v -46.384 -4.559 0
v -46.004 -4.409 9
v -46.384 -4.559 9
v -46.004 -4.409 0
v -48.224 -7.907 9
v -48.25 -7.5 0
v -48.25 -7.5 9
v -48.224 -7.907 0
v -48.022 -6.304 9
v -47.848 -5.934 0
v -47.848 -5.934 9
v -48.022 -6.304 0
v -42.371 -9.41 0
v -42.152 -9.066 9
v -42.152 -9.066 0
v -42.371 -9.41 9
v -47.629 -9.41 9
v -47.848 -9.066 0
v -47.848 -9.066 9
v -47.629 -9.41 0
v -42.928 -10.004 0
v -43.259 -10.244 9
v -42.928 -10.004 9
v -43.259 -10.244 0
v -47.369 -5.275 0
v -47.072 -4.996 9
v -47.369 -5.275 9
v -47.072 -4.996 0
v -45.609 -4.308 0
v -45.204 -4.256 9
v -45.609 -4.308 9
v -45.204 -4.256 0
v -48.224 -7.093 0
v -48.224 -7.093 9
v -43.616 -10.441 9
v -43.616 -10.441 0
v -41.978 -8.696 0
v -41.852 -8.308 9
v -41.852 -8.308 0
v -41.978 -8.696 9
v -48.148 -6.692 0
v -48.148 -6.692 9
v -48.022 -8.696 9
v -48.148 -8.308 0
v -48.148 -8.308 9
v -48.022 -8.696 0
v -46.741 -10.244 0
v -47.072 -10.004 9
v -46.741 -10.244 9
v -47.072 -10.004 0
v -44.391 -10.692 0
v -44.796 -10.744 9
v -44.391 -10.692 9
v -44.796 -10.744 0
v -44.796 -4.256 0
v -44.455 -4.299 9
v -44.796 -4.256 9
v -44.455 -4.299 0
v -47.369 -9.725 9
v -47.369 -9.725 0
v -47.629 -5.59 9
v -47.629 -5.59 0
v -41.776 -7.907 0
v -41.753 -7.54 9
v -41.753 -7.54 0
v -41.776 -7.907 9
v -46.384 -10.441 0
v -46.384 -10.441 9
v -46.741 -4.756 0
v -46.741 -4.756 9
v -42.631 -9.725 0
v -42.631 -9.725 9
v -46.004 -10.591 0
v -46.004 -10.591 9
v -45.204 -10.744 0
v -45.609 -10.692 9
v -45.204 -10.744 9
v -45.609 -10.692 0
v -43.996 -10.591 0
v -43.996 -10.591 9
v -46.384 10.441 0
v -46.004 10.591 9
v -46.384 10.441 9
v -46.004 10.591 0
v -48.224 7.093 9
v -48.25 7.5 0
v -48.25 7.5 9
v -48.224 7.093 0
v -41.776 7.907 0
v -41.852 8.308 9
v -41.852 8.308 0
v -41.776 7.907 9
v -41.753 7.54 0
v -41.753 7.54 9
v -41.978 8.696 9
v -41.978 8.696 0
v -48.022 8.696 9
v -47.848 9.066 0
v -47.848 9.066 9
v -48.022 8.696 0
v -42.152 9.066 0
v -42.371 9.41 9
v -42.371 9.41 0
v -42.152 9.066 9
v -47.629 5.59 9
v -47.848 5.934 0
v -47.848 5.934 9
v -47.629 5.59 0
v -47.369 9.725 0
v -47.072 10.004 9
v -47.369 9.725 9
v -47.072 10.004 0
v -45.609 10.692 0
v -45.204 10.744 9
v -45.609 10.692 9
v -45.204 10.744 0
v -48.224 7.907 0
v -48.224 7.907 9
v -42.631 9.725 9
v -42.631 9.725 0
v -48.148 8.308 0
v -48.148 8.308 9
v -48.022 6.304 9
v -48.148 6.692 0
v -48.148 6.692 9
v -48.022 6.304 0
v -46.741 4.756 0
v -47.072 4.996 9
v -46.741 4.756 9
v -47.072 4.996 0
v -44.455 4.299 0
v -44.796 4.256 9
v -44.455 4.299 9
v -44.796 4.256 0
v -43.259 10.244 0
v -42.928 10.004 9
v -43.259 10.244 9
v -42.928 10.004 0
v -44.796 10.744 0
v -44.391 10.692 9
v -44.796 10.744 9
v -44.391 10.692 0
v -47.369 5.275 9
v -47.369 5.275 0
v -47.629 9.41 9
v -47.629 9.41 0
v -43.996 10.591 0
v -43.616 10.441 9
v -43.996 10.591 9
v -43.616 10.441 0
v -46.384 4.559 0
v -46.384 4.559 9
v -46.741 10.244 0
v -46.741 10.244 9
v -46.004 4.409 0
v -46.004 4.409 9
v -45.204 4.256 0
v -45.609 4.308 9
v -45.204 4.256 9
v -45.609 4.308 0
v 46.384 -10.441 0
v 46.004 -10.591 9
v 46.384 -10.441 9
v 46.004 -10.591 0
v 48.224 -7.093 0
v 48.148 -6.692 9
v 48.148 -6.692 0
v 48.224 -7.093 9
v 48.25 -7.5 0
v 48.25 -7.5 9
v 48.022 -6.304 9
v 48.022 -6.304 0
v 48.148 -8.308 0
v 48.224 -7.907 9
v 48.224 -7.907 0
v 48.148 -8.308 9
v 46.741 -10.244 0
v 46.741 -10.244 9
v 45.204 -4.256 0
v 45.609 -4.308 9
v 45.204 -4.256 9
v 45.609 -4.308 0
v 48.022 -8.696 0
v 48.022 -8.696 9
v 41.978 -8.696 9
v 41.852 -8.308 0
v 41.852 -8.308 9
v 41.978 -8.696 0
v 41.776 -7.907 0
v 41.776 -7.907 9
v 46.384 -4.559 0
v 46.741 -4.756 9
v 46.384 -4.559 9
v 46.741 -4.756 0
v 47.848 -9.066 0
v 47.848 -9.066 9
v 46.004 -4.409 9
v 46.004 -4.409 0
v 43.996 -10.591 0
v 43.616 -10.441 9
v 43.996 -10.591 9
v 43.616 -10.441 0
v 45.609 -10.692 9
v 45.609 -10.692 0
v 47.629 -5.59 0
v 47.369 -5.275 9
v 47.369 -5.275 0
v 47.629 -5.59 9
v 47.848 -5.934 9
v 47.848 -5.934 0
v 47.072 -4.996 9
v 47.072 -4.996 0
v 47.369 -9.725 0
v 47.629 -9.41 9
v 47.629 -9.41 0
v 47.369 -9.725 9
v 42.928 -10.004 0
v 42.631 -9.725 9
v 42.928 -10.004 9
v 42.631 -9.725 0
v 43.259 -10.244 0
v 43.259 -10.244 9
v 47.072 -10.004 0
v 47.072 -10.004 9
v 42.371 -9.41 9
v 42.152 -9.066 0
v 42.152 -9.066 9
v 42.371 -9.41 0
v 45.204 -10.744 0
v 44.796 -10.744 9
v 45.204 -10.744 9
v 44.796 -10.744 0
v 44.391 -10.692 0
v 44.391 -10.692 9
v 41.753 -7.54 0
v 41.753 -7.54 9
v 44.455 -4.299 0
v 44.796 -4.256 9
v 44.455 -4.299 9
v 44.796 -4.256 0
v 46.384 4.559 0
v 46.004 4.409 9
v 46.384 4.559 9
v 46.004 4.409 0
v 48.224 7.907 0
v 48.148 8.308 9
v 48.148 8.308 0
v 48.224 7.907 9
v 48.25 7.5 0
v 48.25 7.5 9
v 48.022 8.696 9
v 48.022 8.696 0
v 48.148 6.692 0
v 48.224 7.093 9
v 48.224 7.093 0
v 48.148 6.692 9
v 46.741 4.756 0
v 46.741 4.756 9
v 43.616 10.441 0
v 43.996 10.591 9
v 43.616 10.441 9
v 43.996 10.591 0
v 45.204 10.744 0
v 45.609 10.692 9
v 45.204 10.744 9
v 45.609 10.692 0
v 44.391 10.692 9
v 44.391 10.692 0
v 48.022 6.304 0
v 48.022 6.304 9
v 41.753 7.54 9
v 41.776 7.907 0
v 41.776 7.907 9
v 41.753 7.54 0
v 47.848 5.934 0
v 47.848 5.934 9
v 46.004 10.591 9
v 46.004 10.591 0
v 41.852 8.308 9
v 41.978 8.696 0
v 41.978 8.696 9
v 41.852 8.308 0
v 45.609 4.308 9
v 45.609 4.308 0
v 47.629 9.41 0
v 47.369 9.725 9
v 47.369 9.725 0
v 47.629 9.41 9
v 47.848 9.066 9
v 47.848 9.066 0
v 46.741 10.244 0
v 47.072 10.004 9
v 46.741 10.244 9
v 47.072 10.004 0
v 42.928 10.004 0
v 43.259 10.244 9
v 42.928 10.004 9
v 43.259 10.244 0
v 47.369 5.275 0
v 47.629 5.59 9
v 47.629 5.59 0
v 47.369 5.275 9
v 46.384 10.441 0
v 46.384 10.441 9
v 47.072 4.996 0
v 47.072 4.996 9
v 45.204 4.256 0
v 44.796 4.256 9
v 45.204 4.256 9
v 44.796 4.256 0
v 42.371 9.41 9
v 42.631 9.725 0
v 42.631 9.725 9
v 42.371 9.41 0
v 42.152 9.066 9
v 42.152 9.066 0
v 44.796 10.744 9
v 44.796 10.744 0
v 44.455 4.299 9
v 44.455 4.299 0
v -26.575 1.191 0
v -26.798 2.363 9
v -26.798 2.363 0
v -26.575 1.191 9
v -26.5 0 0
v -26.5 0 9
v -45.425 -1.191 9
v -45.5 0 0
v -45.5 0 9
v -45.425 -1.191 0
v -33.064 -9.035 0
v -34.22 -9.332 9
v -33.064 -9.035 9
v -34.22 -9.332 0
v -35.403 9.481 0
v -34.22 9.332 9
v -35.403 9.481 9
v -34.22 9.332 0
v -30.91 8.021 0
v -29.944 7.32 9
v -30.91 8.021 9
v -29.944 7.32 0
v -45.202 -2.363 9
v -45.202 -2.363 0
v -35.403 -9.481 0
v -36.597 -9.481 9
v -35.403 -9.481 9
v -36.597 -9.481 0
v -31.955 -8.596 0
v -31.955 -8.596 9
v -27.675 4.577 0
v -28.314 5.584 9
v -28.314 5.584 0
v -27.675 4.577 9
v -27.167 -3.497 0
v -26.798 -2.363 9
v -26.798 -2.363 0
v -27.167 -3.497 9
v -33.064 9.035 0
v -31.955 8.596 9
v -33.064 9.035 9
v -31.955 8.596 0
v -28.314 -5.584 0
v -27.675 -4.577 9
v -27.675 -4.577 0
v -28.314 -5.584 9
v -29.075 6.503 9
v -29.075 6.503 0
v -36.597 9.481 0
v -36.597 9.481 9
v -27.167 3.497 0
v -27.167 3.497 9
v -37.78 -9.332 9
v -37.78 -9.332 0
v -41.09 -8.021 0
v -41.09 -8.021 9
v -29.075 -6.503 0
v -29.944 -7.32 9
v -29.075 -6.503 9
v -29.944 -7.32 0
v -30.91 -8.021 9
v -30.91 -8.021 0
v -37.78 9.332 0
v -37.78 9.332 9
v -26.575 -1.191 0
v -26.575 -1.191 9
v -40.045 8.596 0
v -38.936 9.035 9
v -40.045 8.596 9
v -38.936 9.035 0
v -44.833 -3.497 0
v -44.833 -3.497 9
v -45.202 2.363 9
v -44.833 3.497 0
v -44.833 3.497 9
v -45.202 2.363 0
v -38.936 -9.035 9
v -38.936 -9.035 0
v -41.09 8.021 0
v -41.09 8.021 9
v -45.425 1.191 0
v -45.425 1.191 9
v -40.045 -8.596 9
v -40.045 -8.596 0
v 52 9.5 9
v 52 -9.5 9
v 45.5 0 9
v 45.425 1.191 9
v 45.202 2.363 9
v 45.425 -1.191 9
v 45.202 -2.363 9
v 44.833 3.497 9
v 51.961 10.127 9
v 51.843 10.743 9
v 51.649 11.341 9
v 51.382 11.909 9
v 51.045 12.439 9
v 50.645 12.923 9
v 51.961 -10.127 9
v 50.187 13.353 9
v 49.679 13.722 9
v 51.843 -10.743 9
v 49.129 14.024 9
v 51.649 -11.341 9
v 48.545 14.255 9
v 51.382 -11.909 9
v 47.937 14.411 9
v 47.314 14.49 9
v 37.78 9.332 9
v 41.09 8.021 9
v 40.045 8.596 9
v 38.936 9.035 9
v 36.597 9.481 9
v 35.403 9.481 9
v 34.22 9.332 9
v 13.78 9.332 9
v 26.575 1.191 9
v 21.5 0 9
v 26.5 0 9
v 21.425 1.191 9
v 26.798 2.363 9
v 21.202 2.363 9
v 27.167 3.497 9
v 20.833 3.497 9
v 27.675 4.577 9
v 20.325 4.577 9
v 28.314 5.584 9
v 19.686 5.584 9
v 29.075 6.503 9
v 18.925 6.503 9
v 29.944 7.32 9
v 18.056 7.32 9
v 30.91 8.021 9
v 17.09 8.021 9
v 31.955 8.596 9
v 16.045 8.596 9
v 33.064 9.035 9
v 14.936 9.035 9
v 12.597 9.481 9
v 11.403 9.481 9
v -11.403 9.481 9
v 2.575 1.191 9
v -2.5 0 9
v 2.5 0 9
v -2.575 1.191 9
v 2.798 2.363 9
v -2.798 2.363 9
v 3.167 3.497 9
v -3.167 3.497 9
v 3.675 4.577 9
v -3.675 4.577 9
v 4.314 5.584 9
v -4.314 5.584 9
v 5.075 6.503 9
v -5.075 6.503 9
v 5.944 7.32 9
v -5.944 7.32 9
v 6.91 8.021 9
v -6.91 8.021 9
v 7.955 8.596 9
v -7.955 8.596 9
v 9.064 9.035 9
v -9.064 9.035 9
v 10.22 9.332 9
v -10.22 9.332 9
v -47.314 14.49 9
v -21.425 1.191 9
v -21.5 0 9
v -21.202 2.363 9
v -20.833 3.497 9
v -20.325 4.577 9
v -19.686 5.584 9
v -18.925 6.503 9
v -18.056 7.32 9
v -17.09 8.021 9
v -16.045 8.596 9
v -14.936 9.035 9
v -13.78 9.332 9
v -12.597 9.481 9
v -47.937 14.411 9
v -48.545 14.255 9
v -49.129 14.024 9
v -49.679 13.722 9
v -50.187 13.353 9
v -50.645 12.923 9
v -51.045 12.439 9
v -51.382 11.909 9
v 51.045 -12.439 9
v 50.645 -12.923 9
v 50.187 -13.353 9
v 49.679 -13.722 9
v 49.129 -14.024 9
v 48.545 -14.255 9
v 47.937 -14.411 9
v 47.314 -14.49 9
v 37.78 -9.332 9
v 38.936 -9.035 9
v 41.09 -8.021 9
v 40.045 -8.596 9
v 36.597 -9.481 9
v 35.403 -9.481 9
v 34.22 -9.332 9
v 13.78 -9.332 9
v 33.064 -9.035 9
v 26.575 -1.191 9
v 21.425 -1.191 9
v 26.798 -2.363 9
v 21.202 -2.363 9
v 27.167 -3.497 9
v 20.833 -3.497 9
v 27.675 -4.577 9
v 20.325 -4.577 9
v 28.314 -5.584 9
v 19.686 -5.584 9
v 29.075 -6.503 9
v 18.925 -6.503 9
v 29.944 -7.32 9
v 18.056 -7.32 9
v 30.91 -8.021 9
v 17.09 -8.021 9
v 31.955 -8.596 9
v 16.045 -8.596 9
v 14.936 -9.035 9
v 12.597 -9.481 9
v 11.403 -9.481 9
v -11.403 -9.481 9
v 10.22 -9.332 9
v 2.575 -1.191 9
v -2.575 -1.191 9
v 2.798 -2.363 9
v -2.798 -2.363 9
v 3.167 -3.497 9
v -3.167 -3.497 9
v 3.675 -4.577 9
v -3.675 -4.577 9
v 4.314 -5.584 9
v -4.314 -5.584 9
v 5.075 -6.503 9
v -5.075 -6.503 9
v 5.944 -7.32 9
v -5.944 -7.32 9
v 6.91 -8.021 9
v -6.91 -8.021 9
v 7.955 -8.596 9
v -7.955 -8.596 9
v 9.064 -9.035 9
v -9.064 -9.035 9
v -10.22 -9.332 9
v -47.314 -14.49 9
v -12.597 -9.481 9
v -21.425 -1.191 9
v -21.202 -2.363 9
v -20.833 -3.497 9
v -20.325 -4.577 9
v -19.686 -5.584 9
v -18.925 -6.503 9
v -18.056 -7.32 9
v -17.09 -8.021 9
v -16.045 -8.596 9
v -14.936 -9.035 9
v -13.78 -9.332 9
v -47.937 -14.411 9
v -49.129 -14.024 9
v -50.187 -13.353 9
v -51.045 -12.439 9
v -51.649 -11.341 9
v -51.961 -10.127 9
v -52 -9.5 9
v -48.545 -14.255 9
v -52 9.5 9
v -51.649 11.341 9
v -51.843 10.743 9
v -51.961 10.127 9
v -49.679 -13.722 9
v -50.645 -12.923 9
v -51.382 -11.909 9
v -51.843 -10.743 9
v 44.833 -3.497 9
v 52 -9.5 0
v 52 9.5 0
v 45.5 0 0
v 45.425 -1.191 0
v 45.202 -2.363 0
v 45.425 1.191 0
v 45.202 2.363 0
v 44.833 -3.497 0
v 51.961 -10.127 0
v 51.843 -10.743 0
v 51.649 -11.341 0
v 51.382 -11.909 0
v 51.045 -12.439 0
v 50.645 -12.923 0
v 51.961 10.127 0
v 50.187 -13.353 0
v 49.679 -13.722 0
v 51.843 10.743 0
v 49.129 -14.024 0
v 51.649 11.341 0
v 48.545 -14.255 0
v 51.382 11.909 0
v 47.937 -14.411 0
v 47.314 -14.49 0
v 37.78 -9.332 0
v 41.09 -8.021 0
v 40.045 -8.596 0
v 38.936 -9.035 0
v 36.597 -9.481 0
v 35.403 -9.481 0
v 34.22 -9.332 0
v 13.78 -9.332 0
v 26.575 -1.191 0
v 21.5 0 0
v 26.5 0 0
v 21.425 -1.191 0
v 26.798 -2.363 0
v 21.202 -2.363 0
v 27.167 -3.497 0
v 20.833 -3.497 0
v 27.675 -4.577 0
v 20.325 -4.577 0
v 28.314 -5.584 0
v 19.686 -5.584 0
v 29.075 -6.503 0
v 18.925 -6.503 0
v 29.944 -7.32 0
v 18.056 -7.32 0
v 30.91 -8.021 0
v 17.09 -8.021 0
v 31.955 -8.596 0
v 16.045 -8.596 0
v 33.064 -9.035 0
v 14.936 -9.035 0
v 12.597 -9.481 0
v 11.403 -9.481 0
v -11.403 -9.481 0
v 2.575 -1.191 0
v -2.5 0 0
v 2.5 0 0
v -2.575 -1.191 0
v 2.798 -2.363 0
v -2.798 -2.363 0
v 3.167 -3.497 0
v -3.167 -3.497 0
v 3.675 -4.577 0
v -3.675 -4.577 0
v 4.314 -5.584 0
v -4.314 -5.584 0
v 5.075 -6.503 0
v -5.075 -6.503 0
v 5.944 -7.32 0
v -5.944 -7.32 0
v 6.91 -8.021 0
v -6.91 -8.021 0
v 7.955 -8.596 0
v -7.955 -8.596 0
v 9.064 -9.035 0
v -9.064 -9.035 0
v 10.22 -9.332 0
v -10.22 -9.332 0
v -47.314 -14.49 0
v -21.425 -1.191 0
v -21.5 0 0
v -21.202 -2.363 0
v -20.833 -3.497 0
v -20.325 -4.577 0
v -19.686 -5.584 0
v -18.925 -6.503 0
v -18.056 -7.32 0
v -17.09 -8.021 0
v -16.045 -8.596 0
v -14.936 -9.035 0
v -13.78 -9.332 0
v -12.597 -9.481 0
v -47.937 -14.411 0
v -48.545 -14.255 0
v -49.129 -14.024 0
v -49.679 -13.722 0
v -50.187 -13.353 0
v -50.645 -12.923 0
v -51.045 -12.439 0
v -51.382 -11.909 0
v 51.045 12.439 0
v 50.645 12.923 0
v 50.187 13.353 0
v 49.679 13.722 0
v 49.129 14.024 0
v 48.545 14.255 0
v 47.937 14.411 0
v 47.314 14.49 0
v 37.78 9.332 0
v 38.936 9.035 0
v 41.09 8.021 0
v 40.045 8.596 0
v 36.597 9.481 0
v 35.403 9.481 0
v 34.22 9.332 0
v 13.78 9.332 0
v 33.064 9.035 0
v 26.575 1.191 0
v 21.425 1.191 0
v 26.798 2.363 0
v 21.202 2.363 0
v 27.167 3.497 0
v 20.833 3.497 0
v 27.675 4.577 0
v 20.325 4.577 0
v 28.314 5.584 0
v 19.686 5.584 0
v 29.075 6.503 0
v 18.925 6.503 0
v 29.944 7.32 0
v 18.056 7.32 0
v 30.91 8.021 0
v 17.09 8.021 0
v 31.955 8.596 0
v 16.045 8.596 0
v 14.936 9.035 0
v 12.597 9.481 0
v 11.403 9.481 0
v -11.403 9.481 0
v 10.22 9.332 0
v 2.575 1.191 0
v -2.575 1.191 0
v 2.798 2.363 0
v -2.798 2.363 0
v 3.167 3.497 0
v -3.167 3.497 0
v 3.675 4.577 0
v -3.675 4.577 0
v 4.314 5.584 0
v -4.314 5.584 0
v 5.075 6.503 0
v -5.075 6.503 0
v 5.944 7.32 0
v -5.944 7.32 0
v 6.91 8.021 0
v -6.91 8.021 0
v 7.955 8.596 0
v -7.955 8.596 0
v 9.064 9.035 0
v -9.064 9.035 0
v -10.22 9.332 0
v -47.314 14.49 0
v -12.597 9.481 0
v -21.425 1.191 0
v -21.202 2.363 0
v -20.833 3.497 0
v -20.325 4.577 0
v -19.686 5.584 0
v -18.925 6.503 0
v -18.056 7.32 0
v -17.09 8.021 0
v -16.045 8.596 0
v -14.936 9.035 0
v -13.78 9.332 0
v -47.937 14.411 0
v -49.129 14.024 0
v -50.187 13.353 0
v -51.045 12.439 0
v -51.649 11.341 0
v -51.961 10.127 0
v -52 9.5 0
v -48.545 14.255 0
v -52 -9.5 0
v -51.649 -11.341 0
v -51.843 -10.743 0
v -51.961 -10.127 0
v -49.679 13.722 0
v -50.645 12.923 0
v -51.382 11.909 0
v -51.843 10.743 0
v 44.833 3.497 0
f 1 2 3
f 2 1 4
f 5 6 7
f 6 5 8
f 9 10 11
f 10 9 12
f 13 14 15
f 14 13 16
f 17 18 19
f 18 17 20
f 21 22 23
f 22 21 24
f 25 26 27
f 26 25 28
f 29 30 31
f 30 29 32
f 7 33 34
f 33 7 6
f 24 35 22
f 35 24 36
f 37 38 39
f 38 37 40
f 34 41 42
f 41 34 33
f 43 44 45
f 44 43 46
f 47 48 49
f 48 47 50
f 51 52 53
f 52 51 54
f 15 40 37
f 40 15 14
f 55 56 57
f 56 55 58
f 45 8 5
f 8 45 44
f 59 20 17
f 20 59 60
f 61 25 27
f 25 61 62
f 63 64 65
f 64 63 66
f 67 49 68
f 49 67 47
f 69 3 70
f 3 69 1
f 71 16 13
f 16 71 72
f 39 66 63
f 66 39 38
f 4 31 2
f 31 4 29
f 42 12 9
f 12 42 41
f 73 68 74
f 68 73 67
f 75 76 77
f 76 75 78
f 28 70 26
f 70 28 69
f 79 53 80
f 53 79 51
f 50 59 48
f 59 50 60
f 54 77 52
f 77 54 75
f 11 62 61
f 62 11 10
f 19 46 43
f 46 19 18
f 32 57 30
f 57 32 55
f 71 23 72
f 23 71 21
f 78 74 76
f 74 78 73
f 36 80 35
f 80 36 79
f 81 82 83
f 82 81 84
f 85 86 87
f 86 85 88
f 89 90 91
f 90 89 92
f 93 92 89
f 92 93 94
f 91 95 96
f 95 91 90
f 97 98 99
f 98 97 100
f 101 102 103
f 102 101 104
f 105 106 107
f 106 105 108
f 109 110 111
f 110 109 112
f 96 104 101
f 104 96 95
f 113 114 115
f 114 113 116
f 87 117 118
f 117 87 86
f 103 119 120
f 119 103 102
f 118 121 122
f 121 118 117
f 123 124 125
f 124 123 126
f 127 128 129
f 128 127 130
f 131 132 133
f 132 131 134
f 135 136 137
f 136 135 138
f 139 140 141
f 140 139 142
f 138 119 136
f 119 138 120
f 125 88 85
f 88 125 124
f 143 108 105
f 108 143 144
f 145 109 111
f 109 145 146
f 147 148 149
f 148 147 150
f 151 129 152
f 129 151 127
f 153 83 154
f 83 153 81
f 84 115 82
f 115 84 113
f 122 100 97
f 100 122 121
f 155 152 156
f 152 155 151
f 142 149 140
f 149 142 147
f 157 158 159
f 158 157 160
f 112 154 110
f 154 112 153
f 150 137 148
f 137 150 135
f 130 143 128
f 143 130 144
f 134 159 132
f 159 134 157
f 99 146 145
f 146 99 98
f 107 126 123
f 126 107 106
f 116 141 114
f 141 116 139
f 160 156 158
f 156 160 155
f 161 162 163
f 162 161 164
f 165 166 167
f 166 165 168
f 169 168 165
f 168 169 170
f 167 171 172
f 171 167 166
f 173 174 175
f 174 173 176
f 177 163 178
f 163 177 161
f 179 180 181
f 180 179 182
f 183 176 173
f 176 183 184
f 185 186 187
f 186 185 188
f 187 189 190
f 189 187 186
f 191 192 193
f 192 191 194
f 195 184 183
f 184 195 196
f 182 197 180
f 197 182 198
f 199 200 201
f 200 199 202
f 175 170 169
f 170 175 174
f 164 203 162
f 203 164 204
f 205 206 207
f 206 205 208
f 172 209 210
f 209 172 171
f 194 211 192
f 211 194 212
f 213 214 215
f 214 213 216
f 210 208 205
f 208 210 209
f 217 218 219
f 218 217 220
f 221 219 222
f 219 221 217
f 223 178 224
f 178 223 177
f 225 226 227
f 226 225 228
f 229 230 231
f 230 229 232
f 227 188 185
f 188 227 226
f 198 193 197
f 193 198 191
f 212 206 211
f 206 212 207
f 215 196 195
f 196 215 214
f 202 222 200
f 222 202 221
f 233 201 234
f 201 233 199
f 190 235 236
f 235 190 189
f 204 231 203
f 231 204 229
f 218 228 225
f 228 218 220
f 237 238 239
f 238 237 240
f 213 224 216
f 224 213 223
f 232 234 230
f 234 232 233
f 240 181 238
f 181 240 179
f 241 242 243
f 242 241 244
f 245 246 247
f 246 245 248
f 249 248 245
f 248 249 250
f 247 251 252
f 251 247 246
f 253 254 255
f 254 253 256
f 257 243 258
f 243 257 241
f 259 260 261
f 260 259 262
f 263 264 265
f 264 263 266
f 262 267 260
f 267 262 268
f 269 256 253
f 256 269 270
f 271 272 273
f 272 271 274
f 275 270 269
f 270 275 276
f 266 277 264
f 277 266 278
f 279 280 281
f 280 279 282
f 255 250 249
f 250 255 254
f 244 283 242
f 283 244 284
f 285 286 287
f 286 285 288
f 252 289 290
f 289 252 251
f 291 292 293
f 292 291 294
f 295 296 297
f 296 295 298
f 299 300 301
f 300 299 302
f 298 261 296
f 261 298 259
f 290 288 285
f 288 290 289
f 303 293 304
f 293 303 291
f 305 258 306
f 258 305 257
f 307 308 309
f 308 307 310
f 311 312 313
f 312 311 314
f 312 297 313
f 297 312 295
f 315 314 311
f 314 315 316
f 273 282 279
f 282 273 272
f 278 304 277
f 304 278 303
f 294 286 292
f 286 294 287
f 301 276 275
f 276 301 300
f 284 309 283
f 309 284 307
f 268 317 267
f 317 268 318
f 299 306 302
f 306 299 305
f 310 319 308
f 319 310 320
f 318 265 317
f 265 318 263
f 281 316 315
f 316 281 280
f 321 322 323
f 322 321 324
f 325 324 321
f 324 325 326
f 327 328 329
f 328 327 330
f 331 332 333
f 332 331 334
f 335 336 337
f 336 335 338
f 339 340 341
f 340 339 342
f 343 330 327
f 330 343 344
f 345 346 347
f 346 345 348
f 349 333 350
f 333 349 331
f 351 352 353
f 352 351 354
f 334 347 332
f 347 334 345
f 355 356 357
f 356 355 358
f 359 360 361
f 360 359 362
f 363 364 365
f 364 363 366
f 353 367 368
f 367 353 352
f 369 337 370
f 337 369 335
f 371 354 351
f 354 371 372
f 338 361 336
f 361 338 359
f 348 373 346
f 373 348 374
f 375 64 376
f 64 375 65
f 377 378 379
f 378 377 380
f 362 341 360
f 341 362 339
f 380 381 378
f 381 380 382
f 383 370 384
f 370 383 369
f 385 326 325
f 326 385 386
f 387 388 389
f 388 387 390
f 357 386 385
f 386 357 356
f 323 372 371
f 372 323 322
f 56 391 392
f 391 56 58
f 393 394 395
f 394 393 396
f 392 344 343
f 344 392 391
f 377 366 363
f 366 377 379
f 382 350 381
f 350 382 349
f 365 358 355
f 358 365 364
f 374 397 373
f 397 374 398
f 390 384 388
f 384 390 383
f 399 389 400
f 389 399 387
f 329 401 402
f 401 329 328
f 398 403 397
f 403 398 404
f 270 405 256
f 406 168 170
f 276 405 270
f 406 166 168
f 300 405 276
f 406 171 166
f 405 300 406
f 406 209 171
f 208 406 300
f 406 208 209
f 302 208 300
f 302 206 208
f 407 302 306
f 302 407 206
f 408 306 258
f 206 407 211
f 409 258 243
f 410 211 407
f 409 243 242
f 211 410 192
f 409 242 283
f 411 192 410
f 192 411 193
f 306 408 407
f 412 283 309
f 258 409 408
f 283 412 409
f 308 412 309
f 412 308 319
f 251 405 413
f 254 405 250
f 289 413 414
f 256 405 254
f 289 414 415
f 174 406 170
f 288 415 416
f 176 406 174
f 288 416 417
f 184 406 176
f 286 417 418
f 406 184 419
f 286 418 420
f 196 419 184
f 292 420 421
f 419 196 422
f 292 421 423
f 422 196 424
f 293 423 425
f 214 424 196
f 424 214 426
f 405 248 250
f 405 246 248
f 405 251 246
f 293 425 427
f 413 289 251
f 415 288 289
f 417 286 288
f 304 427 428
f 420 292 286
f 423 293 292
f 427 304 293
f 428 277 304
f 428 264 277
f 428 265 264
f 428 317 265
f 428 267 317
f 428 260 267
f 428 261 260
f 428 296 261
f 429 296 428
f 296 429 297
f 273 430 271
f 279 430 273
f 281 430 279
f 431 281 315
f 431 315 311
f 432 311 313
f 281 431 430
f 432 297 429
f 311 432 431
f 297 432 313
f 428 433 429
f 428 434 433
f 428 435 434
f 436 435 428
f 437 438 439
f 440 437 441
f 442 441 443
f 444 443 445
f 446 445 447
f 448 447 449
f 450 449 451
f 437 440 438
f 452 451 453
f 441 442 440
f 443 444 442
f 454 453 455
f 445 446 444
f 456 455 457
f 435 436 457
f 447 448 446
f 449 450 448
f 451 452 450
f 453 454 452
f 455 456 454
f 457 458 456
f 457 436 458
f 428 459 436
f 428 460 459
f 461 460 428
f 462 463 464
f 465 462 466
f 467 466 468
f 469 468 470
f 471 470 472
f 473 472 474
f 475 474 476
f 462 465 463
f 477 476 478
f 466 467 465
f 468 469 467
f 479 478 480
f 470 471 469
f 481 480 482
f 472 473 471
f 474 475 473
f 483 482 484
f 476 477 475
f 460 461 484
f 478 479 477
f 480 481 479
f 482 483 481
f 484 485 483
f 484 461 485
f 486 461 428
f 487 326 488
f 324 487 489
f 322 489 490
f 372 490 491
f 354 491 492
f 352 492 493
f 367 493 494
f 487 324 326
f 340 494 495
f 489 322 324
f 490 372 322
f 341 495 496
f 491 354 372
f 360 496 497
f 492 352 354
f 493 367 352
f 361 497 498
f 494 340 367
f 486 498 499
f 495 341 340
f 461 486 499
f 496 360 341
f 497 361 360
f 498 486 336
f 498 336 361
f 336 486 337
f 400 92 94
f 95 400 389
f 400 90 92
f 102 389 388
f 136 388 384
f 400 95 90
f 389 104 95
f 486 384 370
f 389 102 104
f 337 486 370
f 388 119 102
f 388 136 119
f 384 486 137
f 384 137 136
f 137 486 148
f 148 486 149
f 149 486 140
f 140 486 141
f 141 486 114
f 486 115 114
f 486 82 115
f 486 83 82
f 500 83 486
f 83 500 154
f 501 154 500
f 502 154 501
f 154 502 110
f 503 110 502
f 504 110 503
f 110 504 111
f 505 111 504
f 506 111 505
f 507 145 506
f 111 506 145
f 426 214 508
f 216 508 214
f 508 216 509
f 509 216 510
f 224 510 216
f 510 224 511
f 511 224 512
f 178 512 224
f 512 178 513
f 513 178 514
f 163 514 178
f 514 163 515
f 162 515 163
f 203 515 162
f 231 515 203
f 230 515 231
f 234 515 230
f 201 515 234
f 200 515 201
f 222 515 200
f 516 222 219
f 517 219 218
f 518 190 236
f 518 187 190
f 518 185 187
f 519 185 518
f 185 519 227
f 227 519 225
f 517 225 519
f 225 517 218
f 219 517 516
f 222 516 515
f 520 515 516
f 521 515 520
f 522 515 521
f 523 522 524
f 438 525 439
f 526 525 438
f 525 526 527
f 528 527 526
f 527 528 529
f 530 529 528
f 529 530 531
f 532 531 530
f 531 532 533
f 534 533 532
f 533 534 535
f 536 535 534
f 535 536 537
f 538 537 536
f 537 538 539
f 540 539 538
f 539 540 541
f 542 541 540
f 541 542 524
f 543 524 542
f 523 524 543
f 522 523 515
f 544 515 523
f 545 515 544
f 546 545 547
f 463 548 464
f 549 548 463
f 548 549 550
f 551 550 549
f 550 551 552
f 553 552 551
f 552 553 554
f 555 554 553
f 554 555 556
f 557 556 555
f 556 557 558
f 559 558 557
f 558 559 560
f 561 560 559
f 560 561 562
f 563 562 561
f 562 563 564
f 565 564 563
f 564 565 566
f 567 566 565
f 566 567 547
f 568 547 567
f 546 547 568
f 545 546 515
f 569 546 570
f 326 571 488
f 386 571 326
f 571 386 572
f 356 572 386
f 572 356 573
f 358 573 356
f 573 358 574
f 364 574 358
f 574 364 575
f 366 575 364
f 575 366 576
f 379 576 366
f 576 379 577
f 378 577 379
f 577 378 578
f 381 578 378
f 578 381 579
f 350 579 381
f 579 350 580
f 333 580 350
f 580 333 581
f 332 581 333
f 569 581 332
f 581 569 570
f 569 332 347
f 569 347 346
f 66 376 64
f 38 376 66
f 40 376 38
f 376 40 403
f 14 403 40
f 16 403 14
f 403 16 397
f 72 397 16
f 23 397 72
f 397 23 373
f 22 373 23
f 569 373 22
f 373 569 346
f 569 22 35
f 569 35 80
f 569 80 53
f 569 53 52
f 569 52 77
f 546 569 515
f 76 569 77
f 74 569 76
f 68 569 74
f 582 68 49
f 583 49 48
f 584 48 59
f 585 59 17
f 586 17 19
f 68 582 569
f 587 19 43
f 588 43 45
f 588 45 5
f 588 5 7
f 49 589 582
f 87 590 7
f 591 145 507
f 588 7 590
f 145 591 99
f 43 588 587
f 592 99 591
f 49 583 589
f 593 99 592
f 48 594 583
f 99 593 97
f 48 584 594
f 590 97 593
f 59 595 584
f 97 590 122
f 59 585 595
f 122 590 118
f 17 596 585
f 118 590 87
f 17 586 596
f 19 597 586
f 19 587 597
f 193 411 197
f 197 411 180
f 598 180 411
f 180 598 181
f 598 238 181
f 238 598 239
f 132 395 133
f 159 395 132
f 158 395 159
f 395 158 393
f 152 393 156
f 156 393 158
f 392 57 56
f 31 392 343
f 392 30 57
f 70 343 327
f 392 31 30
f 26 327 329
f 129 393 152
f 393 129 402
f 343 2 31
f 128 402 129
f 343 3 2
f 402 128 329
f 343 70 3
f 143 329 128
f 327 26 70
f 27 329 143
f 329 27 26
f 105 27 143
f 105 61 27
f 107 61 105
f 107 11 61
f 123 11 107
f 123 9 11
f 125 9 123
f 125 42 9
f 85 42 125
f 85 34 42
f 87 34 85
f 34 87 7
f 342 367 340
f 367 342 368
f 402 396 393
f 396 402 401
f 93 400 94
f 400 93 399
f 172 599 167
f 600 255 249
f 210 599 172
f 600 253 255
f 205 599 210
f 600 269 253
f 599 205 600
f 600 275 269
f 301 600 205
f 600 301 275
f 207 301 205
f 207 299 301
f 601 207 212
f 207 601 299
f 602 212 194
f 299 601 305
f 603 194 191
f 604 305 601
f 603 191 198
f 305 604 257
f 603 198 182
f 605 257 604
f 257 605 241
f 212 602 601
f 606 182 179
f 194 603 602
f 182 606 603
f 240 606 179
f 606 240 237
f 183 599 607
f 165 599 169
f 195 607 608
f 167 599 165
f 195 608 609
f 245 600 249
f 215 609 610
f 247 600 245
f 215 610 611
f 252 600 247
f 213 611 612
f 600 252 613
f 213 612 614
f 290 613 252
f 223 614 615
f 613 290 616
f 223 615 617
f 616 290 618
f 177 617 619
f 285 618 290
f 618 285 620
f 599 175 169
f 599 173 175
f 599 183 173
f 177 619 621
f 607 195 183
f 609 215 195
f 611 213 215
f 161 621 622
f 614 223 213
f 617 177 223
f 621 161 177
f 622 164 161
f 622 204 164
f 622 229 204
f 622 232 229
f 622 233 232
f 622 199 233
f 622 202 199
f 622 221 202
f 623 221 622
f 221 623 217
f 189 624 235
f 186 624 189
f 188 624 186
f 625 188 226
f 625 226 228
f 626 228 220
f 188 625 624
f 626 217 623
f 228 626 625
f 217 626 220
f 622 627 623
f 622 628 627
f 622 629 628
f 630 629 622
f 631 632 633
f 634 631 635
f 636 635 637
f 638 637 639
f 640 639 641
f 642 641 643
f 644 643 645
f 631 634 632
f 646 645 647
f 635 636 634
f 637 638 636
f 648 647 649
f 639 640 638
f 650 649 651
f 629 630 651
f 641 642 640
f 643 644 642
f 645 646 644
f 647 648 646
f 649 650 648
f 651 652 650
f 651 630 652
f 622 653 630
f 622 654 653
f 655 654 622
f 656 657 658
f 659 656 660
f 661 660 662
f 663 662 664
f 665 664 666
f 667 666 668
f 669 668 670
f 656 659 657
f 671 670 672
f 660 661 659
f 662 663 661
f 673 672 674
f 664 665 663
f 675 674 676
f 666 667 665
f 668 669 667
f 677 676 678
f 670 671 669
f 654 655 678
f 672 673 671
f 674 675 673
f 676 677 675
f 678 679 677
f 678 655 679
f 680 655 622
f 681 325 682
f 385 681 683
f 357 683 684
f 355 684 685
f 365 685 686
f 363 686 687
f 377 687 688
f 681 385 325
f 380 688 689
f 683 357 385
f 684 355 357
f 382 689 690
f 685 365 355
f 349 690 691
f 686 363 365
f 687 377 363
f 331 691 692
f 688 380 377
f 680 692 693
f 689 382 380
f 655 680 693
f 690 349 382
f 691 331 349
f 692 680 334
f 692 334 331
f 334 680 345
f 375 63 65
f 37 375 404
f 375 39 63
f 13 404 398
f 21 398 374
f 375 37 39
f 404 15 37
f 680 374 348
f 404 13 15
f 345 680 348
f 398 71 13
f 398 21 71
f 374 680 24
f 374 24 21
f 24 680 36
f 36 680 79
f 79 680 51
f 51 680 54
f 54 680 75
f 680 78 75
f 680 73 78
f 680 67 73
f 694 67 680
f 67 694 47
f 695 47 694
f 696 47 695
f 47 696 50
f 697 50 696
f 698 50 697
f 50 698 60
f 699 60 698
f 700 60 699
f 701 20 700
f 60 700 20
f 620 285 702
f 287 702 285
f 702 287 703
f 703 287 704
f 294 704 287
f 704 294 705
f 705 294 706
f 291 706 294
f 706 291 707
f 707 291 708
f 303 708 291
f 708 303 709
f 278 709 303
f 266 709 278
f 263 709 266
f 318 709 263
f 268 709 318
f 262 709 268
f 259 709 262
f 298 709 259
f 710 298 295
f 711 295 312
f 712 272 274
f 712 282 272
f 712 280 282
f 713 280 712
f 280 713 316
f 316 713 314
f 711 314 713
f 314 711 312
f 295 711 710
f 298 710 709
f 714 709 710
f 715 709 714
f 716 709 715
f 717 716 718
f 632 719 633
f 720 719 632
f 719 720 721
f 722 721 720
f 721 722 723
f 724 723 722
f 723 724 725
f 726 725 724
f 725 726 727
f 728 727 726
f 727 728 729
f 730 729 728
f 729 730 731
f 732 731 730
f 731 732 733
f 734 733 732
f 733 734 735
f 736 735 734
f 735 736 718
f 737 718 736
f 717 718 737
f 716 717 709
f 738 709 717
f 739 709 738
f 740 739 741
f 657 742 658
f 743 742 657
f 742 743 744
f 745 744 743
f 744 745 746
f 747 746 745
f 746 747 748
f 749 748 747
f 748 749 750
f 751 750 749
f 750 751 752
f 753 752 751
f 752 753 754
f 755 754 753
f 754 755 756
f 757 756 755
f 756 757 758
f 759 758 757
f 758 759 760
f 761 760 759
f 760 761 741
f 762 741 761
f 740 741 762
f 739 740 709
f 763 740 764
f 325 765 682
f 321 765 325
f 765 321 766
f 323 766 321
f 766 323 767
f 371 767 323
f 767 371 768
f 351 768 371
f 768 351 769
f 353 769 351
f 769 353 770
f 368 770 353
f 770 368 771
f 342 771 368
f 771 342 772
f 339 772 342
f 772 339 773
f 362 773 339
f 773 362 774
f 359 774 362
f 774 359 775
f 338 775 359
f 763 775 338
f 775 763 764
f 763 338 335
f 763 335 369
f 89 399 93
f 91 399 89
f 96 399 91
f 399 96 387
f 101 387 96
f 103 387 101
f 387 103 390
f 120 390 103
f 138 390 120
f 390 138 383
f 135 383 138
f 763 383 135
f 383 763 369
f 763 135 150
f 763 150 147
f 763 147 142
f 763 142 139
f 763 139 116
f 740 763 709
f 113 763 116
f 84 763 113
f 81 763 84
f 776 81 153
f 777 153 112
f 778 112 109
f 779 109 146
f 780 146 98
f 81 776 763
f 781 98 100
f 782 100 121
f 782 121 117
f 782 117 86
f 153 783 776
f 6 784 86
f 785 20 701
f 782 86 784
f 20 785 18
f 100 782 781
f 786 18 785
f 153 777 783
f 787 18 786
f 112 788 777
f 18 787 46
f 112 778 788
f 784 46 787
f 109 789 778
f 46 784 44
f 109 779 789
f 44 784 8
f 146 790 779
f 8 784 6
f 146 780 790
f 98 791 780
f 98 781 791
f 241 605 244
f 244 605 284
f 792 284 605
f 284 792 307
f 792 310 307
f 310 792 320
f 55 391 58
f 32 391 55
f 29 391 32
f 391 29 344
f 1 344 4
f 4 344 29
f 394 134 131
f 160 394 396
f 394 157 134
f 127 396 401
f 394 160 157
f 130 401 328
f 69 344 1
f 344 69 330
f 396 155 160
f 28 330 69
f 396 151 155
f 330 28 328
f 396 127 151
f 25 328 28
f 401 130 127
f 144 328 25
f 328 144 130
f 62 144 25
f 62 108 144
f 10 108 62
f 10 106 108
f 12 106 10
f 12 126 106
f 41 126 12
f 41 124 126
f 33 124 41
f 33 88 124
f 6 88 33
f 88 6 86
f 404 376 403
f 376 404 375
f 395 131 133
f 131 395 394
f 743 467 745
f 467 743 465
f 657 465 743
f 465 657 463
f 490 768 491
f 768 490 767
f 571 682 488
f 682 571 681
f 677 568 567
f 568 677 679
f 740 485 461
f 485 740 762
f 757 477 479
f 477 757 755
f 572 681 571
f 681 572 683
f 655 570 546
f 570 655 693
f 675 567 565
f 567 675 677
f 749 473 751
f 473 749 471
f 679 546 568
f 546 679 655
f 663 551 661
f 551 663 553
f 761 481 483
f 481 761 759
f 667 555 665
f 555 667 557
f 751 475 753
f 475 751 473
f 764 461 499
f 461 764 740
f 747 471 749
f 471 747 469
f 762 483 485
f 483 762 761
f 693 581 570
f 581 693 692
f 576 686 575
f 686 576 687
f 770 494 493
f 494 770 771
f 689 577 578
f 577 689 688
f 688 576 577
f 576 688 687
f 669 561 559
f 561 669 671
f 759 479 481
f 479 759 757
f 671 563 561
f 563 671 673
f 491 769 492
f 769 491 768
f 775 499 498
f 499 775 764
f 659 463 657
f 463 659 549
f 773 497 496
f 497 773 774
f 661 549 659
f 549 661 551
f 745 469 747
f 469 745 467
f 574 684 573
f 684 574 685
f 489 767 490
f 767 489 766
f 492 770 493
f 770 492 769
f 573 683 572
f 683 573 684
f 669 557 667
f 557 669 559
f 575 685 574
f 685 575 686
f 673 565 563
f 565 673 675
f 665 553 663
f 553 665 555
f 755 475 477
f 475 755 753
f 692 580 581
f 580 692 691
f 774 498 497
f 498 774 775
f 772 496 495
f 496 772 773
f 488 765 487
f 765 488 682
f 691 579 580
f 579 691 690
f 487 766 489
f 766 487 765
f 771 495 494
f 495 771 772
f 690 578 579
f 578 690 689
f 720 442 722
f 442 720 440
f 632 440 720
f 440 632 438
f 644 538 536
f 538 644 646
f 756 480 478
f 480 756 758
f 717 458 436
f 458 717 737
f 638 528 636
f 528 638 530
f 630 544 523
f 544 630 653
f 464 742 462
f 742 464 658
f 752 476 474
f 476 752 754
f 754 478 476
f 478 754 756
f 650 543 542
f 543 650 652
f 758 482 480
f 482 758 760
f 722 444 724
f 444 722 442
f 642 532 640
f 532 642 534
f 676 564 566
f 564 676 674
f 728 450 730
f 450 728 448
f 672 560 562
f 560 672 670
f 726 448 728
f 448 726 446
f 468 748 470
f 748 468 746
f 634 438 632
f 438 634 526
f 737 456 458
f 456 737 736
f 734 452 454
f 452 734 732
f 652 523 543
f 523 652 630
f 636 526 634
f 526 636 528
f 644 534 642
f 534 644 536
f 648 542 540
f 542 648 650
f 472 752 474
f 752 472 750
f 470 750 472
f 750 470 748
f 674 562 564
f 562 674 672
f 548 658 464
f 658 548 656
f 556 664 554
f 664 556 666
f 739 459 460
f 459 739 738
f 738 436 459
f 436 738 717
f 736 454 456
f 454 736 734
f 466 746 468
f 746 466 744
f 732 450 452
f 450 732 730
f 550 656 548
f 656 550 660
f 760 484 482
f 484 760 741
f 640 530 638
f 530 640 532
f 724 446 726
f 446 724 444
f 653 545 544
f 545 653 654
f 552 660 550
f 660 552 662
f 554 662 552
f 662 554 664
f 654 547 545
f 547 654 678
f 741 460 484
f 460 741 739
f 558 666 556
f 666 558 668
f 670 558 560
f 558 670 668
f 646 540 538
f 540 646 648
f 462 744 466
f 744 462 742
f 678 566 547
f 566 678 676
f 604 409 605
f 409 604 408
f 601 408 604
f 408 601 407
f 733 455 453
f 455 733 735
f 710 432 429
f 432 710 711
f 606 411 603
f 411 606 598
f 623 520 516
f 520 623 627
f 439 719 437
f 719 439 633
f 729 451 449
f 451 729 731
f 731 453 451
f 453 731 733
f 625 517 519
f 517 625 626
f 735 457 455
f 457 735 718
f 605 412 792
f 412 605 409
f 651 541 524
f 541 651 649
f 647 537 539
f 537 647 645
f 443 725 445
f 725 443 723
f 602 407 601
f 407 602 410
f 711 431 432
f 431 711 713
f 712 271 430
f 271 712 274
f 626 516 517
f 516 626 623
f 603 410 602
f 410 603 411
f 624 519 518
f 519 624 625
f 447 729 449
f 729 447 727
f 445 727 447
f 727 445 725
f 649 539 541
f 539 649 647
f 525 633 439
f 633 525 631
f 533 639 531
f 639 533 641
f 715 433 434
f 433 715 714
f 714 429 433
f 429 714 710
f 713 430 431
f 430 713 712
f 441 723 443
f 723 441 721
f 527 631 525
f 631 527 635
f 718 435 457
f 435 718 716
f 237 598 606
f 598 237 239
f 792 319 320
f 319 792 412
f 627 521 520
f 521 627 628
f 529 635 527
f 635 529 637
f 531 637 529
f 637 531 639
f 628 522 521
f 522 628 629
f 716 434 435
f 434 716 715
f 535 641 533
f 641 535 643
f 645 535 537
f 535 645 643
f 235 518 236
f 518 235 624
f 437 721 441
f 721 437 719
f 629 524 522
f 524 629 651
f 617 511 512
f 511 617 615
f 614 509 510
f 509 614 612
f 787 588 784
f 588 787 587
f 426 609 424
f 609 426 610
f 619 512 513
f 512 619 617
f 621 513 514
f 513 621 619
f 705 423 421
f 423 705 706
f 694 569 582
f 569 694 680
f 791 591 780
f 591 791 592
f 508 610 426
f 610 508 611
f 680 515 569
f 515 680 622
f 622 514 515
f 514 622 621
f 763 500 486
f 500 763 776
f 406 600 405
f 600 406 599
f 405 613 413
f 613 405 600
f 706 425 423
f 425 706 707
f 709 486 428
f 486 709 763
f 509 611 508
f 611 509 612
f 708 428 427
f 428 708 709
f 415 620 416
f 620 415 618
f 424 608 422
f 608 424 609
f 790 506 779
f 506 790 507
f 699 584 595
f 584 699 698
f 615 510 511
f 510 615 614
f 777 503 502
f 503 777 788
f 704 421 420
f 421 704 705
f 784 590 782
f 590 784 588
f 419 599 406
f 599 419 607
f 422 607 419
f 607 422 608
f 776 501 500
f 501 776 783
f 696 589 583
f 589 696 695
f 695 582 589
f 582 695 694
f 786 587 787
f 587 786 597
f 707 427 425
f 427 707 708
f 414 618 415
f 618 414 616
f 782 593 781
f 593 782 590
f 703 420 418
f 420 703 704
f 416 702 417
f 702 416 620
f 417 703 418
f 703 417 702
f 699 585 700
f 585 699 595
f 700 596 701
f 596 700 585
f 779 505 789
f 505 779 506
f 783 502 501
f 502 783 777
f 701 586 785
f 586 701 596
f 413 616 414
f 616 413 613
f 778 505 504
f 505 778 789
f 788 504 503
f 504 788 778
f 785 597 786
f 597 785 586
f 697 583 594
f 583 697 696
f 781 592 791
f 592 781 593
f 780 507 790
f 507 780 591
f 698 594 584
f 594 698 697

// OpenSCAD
$fn = 50;


difference() {
	union() {
		hull() {
			translate(v = [-47.0000000000, 9.5000000000, 0]) {
				cylinder(h = 9, r = 5);
			}
			translate(v = [47.0000000000, 9.5000000000, 0]) {
				cylinder(h = 9, r = 5);
			}
			translate(v = [-47.0000000000, -9.5000000000, 0]) {
				cylinder(h = 9, r = 5);
			}
			translate(v = [47.0000000000, -9.5000000000, 0]) {
				cylinder(h = 9, r = 5);
			}
		}
	}
	union() {
		#translate(v = [-45.0000000000, -7.5000000000, -100.0000000000]) {
			cylinder(h = 200, r = 3.2500000000);
		}
		#translate(v = [-45.0000000000, 7.5000000000, -100.0000000000]) {
			cylinder(h = 200, r = 3.2500000000);
		}
		#translate(v = [45.0000000000, -7.5000000000, -100.0000000000]) {
			cylinder(h = 200, r = 3.2500000000);
		}
		#translate(v = [45.0000000000, 7.5000000000, -100.0000000000]) {
			cylinder(h = 200, r = 3.2500000000);
		}
		#translate(v = [-36.0000000000, 0, 0]) {
			cylinder(h = 9, r = 9.5000000000);
		}
		#translate(v = [-12.0000000000, 0, 0]) {
			cylinder(h = 9, r = 9.5000000000);
		}
		#translate(v = [12.0000000000, 0, 0]) {
			cylinder(h = 9, r = 9.5000000000);
		}
		#translate(v = [36.0000000000, 0, 0]) {
			cylinder(h = 9, r = 9.5000000000);
		}
	}
}
